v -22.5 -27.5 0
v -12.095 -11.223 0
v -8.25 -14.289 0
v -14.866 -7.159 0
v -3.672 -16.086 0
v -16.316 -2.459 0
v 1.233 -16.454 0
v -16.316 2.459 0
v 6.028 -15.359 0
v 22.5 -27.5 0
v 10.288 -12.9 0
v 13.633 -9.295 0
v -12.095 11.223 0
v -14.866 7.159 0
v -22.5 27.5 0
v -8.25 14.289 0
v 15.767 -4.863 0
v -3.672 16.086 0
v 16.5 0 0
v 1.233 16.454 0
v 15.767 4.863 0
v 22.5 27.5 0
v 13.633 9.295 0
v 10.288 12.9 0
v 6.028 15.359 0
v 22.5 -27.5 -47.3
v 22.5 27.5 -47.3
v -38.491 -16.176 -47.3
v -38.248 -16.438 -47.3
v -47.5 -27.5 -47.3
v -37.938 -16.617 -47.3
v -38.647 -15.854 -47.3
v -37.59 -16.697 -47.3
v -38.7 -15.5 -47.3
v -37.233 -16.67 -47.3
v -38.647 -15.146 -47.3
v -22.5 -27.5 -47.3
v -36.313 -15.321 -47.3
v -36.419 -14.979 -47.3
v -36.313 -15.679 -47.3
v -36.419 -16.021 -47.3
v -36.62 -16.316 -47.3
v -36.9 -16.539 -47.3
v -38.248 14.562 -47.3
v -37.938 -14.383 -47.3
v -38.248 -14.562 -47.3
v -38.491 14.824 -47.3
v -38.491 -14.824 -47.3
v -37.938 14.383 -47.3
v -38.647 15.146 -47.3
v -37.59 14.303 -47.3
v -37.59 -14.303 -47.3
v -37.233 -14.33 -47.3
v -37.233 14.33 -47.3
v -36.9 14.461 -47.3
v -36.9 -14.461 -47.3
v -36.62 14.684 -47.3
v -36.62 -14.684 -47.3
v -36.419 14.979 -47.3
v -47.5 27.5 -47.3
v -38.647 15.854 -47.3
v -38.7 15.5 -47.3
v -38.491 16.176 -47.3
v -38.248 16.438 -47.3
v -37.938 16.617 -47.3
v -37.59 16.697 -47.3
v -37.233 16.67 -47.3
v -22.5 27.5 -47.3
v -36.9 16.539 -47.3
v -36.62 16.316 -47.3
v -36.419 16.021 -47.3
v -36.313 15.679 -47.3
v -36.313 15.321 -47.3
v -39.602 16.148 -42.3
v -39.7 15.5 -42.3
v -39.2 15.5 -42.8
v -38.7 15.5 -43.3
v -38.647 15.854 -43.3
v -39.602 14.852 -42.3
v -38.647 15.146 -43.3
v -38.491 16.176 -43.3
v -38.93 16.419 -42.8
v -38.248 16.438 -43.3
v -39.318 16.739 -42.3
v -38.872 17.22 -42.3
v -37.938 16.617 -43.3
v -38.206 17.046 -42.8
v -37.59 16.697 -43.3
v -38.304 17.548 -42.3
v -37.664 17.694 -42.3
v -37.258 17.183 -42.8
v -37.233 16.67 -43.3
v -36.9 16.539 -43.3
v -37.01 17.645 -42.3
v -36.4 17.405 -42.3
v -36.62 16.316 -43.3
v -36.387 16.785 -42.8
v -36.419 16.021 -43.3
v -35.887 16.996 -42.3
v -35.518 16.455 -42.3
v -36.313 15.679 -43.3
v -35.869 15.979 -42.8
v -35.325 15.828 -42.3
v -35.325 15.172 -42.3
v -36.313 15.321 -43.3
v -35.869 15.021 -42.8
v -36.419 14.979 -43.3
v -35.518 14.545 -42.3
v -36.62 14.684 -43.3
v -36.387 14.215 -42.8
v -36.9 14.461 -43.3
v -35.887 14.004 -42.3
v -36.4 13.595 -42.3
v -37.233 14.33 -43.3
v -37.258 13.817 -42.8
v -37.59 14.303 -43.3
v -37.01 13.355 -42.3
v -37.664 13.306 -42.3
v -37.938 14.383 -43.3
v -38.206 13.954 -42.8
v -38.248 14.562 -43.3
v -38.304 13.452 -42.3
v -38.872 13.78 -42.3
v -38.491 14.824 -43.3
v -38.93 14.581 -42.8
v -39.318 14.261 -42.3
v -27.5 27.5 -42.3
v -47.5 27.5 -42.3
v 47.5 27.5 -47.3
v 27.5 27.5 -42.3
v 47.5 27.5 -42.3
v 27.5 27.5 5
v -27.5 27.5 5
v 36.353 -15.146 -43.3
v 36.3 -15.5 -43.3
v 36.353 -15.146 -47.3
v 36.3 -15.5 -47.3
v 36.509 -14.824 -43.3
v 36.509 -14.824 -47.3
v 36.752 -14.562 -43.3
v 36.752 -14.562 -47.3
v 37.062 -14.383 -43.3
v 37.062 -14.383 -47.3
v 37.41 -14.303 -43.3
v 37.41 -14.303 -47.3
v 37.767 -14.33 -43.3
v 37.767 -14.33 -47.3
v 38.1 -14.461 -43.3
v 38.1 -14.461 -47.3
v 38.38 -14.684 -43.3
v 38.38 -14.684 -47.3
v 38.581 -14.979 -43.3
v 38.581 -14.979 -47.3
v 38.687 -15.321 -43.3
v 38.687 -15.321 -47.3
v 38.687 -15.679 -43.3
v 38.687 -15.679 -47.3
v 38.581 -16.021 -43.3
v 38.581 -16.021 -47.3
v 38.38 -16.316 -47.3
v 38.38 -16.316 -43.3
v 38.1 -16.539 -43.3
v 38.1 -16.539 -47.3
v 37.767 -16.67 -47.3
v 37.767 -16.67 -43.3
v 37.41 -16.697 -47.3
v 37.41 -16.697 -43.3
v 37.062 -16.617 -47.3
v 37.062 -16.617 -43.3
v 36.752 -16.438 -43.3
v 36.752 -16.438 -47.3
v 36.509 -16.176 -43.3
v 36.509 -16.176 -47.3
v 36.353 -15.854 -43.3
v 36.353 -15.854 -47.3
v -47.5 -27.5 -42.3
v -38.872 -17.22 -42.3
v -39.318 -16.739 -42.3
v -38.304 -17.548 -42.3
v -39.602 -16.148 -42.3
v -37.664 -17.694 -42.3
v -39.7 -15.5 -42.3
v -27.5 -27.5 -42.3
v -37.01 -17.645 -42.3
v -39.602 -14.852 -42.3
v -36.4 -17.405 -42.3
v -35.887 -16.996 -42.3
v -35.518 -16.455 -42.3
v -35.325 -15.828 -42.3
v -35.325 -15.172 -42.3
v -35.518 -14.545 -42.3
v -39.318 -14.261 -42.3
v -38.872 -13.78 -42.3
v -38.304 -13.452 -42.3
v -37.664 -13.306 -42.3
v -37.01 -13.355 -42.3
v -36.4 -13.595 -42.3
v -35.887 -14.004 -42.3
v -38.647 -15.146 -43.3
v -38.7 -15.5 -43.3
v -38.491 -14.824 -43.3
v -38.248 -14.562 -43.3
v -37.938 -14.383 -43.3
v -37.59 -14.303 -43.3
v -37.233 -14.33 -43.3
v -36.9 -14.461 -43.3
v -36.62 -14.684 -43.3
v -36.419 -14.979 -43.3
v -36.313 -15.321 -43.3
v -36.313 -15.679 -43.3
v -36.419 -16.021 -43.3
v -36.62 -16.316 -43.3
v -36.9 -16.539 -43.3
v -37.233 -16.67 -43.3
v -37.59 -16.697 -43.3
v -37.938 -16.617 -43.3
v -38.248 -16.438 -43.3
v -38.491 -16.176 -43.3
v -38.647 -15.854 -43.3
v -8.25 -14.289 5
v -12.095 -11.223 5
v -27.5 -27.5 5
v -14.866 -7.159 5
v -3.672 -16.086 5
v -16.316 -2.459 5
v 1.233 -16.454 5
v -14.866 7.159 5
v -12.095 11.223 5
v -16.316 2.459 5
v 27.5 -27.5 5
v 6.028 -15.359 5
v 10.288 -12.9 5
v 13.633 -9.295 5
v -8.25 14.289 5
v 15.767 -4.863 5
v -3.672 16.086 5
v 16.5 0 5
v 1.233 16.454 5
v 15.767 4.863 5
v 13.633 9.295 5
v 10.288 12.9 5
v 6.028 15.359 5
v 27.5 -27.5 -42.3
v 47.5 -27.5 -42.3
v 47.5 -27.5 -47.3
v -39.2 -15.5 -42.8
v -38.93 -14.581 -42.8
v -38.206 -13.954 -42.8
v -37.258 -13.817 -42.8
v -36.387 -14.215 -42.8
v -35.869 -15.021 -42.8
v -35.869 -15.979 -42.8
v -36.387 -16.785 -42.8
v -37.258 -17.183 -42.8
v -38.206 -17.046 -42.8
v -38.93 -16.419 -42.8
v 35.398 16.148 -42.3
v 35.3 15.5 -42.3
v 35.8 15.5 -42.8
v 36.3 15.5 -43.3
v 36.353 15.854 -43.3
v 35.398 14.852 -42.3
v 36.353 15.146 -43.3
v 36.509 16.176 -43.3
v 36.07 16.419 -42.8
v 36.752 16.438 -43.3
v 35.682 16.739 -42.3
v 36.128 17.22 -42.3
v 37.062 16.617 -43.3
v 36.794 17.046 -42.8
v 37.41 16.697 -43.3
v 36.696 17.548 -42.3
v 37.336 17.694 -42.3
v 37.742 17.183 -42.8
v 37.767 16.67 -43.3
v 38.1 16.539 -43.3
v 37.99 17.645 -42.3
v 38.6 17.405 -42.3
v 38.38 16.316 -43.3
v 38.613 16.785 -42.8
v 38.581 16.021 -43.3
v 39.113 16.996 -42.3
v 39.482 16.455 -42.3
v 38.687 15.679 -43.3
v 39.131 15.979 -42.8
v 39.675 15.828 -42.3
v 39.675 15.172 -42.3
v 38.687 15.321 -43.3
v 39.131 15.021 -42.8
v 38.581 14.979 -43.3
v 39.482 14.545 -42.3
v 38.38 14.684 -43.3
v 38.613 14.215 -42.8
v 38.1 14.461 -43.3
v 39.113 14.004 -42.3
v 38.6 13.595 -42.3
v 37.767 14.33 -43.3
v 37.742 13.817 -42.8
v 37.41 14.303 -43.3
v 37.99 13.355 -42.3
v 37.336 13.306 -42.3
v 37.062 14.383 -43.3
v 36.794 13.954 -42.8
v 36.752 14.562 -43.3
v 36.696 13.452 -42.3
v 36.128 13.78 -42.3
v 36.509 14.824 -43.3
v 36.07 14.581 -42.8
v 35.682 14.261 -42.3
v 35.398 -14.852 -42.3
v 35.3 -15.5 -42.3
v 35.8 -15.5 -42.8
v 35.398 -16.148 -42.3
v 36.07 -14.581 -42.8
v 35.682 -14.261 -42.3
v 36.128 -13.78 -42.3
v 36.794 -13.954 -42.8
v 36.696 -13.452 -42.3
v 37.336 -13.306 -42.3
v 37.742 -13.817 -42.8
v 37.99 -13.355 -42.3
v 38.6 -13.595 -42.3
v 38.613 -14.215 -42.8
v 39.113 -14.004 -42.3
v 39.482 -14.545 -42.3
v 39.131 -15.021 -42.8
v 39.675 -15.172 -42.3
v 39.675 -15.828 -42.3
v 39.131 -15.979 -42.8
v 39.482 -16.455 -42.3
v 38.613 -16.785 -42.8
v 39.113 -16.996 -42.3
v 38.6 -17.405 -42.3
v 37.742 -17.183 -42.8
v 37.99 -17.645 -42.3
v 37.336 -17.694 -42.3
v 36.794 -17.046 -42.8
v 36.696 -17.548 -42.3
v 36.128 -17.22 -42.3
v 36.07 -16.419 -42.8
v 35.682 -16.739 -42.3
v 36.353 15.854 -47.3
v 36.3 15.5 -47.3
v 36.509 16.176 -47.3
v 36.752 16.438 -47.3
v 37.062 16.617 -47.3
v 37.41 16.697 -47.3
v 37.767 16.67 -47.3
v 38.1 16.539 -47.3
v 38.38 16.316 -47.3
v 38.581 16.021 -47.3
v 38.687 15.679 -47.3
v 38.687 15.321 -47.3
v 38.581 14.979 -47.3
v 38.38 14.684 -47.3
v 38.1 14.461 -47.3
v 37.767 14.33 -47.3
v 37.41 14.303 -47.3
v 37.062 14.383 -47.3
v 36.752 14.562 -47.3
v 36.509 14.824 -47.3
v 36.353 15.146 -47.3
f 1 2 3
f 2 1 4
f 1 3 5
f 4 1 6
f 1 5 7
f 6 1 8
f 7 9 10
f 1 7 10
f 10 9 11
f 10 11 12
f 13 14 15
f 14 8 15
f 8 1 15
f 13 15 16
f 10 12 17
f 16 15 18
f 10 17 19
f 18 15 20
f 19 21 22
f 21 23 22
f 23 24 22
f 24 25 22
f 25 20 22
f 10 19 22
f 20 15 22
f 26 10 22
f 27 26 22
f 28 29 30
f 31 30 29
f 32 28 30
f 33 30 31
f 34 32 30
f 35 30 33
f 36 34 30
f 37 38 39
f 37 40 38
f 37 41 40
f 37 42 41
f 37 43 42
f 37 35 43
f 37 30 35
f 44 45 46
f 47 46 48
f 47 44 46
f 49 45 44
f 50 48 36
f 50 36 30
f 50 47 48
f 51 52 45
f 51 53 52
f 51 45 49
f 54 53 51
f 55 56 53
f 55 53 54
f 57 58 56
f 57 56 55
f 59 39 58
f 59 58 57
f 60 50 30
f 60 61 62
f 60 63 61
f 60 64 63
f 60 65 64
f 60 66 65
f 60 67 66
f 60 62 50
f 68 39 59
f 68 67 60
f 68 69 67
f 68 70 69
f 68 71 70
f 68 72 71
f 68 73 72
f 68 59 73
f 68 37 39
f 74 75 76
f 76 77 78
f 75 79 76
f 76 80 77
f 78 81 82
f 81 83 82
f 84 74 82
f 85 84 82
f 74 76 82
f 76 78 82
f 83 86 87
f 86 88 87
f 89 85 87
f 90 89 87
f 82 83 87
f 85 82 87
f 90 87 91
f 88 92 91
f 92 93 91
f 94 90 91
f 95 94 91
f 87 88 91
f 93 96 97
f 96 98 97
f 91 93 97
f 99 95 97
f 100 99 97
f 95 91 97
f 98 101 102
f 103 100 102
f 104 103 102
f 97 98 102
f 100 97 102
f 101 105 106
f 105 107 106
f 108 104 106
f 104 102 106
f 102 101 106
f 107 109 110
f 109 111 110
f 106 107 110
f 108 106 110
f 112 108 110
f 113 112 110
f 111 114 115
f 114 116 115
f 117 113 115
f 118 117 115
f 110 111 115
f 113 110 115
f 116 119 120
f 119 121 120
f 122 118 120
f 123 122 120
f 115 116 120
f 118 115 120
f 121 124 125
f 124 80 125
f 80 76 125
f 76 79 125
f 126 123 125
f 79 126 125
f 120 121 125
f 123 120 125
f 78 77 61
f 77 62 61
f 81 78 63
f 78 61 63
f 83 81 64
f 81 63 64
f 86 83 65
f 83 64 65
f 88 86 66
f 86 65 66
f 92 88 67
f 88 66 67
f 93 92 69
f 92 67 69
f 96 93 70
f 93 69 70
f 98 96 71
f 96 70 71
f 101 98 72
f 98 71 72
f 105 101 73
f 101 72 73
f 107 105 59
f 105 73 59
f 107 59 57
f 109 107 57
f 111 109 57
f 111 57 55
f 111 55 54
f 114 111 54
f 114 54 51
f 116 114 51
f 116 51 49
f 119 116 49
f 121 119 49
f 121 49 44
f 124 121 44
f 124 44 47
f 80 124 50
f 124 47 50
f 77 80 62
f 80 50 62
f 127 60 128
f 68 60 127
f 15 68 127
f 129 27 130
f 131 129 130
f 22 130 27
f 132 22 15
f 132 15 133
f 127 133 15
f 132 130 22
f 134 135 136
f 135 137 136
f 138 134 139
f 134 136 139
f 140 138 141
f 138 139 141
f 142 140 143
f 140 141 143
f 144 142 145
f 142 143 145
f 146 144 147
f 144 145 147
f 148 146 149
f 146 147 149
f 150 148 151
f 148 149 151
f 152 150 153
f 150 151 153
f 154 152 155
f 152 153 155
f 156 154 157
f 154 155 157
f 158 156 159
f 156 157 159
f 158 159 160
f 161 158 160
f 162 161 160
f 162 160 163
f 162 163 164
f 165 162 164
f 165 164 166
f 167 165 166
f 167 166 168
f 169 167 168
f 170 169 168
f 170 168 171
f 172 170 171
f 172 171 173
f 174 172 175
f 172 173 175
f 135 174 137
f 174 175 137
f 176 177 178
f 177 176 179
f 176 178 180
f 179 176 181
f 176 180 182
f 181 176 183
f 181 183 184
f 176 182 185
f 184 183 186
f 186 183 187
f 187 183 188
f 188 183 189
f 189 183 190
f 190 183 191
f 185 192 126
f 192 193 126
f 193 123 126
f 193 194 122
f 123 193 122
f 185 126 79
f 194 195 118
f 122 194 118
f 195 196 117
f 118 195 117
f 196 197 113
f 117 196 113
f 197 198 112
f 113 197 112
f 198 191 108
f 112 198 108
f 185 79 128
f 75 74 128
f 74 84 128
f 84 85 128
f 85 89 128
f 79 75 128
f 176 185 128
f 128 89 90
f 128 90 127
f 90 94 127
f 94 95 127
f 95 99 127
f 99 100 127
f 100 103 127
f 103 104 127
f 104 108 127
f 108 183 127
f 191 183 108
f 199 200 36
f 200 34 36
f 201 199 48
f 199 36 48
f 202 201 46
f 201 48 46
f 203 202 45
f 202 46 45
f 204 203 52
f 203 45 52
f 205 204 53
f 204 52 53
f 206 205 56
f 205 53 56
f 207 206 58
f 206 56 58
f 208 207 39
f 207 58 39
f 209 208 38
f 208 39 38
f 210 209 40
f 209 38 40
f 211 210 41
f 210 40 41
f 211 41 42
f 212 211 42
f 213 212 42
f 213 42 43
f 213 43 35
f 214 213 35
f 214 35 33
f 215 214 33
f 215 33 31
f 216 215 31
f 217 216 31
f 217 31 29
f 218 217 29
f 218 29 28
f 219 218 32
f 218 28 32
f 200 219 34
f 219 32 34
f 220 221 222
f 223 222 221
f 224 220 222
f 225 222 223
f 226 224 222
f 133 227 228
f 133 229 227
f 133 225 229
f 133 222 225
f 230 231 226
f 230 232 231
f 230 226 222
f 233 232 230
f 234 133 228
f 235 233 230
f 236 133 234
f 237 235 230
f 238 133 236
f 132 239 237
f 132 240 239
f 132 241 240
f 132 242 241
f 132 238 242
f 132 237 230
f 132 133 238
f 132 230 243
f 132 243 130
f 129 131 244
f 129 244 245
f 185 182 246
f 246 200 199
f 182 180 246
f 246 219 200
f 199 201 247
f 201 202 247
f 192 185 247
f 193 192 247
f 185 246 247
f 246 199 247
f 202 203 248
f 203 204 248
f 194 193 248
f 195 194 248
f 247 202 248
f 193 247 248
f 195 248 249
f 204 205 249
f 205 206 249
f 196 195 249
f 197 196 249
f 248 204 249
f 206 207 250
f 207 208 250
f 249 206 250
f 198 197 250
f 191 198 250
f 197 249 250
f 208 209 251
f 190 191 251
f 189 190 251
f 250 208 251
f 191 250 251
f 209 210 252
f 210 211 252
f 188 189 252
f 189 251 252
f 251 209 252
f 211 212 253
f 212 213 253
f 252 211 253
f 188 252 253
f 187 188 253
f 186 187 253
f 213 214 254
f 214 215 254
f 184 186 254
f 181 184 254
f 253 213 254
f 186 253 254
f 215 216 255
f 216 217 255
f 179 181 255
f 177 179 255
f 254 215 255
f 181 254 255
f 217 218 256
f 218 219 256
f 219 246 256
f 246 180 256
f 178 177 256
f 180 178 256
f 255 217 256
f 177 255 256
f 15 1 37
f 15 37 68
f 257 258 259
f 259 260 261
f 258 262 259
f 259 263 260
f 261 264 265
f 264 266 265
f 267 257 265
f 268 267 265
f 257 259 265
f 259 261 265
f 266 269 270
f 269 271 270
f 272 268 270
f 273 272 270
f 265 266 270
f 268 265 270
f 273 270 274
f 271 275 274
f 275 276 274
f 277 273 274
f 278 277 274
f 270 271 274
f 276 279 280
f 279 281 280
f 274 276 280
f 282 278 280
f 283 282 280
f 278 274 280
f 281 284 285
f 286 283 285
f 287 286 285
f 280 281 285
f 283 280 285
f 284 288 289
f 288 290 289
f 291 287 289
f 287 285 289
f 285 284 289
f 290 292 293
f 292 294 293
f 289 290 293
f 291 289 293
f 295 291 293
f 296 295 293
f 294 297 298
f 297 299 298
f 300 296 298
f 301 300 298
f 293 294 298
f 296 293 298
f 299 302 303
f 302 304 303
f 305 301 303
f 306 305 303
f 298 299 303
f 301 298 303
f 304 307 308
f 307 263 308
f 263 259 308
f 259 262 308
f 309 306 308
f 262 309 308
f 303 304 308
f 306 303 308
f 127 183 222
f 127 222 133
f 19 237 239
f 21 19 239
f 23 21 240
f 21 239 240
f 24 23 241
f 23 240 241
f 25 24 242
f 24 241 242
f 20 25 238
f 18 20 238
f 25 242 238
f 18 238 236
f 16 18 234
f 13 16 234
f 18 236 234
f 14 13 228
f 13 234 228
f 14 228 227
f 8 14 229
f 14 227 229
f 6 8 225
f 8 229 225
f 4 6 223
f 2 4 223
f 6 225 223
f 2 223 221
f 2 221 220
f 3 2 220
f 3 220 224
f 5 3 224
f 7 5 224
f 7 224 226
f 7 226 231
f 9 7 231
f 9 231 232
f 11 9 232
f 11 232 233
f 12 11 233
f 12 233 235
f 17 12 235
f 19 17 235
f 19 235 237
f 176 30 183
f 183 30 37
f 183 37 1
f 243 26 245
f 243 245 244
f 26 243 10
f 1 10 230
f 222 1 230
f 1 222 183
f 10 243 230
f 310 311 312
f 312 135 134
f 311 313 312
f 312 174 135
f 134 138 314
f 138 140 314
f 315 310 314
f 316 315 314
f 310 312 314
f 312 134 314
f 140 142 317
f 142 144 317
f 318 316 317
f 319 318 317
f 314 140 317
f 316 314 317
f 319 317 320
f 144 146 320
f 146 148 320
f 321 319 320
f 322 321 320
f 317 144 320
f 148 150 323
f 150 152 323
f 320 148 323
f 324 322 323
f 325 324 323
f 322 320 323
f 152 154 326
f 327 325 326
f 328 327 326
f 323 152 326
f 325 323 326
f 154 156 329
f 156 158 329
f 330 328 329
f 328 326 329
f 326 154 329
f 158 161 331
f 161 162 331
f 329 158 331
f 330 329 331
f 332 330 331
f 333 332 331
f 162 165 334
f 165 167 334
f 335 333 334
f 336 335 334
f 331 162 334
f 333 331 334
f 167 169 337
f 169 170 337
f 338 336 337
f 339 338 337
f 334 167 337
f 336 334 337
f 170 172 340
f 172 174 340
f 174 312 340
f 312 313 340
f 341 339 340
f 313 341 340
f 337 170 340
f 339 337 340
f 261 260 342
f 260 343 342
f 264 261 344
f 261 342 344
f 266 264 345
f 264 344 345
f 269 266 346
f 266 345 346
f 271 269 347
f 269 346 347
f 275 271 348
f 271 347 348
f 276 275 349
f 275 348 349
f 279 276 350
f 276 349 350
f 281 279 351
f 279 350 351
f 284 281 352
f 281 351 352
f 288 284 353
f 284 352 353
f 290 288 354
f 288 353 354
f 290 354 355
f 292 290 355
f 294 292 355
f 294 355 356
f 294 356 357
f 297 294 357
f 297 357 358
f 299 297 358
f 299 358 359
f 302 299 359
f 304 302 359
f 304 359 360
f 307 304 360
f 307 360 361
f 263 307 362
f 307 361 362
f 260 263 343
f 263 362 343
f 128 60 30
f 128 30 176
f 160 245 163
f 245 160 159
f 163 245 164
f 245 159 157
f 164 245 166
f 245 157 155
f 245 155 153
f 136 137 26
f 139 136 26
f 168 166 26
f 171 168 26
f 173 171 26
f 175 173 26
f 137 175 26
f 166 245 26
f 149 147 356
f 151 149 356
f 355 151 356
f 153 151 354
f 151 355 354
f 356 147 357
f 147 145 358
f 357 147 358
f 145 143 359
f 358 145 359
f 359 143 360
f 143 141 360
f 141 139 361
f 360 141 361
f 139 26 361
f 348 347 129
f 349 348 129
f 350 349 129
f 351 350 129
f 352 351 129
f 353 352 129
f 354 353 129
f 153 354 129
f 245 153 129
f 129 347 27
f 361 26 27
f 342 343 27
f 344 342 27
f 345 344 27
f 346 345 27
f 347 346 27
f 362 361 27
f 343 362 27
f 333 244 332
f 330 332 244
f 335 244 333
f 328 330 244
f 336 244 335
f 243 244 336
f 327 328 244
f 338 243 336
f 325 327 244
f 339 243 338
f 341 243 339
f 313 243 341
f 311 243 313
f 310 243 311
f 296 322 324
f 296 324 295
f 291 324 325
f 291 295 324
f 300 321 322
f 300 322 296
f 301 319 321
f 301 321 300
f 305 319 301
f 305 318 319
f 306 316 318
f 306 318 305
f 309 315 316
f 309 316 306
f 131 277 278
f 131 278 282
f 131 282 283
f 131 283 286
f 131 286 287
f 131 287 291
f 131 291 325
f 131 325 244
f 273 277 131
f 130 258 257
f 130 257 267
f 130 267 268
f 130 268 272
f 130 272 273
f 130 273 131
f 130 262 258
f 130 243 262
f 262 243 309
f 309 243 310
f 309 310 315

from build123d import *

# Parameters (mm, degrees)
SKETCH1_W                                       = 55
SKETCH1_H                                       = 55
BOSS_EXTRUDE1_DEPTH                             = 5
SKETCH2_W                                       = 5
SKETCH2_H                                       = 55
BOSS_EXTRUDE2_DEPTH                             = 47.3
CUT_EXTRUDE1_REACH                              = 54.3
SKETCH3_R                                       = 16.5
SKETCH4_W                                       = 5
SKETCH4_H                                       = 55
BOSS_EXTRUDE3_DEPTH                             = 20
SKETCH5_W                                       = 5
SKETCH5_H                                       = 55
BOSS_EXTRUDE4_DEPTH                             = 20
CSK_FOR_M2_FLAT_HEAD_MACHINE_SCREW1_D           = 2.4
CSK_FOR_M2_FLAT_HEAD_MACHINE_SCREW1_CSINK_D     = 4.4
CSK_FOR_M2_FLAT_HEAD_MACHINE_SCREW1_CSINK_ANGLE = 90


with BuildPart() as part:
    # Sketch1 → Boss-Extrude1 (new body)
    with BuildSketch(Plane.XY):
        Rectangle(SKETCH1_W, SKETCH1_H)
    extrude(amount=BOSS_EXTRUDE1_DEPTH)

    # Sketch2 → Boss-Extrude2 (add)
    with BuildSketch(Plane(origin=(0, 0, 0), x_dir=(-1, 0, 0), z_dir=(0, 0, -1))):
        with Locations((-25, 0)):
            Rectangle(SKETCH2_W, SKETCH2_H)
        with Locations((25, 0)):
            Rectangle(SKETCH2_W, SKETCH2_H)
    extrude(amount=BOSS_EXTRUDE2_DEPTH)

    # Sketch3 → Cut-Extrude1 (cut, up to next)
    with BuildSketch(Plane.XY.offset(5), mode=Mode.PRIVATE) as cut_extrude1_sk1:
        Circle(SKETCH3_R)
    cut_extrude1_tool1 = extrude(cut_extrude1_sk1.sketch, amount=-CUT_EXTRUDE1_REACH, mode=Mode.PRIVATE) & part.part
    add(cut_extrude1_tool1.solids().sort_by_distance((0, 0, 5))[0], mode=Mode.SUBTRACT)

    # Sketch4 → Boss-Extrude3 (add)
    with BuildSketch(Plane(origin=(27.5, 0, 0), x_dir=(0, 0, -1), z_dir=(1, 0, 0))):
        with Locations((44.8, 0)):
            Rectangle(SKETCH4_W, SKETCH4_H)
    extrude(amount=BOSS_EXTRUDE3_DEPTH)

    # Sketch5 → Boss-Extrude4 (add)
    with BuildSketch(Plane.ZY.offset(27.5)):
        with Locations((-44.8, 0)):
            Rectangle(SKETCH5_W, SKETCH5_H)
    extrude(amount=BOSS_EXTRUDE4_DEPTH)

    # CSK for M2 Flat Head Machine Screw1 (through all)
    with Locations(Plane.XY.offset(-42.3)):
        with Locations((-37.5, 15.5), (-37.5, -15.5), (37.5, 15.5), (37.5, -15.5)):
            CounterSinkHole(CSK_FOR_M2_FLAT_HEAD_MACHINE_SCREW1_D / 2, CSK_FOR_M2_FLAT_HEAD_MACHINE_SCREW1_CSINK_D / 2, counter_sink_angle=CSK_FOR_M2_FLAT_HEAD_MACHINE_SCREW1_CSINK_ANGLE)


solid = part.part
